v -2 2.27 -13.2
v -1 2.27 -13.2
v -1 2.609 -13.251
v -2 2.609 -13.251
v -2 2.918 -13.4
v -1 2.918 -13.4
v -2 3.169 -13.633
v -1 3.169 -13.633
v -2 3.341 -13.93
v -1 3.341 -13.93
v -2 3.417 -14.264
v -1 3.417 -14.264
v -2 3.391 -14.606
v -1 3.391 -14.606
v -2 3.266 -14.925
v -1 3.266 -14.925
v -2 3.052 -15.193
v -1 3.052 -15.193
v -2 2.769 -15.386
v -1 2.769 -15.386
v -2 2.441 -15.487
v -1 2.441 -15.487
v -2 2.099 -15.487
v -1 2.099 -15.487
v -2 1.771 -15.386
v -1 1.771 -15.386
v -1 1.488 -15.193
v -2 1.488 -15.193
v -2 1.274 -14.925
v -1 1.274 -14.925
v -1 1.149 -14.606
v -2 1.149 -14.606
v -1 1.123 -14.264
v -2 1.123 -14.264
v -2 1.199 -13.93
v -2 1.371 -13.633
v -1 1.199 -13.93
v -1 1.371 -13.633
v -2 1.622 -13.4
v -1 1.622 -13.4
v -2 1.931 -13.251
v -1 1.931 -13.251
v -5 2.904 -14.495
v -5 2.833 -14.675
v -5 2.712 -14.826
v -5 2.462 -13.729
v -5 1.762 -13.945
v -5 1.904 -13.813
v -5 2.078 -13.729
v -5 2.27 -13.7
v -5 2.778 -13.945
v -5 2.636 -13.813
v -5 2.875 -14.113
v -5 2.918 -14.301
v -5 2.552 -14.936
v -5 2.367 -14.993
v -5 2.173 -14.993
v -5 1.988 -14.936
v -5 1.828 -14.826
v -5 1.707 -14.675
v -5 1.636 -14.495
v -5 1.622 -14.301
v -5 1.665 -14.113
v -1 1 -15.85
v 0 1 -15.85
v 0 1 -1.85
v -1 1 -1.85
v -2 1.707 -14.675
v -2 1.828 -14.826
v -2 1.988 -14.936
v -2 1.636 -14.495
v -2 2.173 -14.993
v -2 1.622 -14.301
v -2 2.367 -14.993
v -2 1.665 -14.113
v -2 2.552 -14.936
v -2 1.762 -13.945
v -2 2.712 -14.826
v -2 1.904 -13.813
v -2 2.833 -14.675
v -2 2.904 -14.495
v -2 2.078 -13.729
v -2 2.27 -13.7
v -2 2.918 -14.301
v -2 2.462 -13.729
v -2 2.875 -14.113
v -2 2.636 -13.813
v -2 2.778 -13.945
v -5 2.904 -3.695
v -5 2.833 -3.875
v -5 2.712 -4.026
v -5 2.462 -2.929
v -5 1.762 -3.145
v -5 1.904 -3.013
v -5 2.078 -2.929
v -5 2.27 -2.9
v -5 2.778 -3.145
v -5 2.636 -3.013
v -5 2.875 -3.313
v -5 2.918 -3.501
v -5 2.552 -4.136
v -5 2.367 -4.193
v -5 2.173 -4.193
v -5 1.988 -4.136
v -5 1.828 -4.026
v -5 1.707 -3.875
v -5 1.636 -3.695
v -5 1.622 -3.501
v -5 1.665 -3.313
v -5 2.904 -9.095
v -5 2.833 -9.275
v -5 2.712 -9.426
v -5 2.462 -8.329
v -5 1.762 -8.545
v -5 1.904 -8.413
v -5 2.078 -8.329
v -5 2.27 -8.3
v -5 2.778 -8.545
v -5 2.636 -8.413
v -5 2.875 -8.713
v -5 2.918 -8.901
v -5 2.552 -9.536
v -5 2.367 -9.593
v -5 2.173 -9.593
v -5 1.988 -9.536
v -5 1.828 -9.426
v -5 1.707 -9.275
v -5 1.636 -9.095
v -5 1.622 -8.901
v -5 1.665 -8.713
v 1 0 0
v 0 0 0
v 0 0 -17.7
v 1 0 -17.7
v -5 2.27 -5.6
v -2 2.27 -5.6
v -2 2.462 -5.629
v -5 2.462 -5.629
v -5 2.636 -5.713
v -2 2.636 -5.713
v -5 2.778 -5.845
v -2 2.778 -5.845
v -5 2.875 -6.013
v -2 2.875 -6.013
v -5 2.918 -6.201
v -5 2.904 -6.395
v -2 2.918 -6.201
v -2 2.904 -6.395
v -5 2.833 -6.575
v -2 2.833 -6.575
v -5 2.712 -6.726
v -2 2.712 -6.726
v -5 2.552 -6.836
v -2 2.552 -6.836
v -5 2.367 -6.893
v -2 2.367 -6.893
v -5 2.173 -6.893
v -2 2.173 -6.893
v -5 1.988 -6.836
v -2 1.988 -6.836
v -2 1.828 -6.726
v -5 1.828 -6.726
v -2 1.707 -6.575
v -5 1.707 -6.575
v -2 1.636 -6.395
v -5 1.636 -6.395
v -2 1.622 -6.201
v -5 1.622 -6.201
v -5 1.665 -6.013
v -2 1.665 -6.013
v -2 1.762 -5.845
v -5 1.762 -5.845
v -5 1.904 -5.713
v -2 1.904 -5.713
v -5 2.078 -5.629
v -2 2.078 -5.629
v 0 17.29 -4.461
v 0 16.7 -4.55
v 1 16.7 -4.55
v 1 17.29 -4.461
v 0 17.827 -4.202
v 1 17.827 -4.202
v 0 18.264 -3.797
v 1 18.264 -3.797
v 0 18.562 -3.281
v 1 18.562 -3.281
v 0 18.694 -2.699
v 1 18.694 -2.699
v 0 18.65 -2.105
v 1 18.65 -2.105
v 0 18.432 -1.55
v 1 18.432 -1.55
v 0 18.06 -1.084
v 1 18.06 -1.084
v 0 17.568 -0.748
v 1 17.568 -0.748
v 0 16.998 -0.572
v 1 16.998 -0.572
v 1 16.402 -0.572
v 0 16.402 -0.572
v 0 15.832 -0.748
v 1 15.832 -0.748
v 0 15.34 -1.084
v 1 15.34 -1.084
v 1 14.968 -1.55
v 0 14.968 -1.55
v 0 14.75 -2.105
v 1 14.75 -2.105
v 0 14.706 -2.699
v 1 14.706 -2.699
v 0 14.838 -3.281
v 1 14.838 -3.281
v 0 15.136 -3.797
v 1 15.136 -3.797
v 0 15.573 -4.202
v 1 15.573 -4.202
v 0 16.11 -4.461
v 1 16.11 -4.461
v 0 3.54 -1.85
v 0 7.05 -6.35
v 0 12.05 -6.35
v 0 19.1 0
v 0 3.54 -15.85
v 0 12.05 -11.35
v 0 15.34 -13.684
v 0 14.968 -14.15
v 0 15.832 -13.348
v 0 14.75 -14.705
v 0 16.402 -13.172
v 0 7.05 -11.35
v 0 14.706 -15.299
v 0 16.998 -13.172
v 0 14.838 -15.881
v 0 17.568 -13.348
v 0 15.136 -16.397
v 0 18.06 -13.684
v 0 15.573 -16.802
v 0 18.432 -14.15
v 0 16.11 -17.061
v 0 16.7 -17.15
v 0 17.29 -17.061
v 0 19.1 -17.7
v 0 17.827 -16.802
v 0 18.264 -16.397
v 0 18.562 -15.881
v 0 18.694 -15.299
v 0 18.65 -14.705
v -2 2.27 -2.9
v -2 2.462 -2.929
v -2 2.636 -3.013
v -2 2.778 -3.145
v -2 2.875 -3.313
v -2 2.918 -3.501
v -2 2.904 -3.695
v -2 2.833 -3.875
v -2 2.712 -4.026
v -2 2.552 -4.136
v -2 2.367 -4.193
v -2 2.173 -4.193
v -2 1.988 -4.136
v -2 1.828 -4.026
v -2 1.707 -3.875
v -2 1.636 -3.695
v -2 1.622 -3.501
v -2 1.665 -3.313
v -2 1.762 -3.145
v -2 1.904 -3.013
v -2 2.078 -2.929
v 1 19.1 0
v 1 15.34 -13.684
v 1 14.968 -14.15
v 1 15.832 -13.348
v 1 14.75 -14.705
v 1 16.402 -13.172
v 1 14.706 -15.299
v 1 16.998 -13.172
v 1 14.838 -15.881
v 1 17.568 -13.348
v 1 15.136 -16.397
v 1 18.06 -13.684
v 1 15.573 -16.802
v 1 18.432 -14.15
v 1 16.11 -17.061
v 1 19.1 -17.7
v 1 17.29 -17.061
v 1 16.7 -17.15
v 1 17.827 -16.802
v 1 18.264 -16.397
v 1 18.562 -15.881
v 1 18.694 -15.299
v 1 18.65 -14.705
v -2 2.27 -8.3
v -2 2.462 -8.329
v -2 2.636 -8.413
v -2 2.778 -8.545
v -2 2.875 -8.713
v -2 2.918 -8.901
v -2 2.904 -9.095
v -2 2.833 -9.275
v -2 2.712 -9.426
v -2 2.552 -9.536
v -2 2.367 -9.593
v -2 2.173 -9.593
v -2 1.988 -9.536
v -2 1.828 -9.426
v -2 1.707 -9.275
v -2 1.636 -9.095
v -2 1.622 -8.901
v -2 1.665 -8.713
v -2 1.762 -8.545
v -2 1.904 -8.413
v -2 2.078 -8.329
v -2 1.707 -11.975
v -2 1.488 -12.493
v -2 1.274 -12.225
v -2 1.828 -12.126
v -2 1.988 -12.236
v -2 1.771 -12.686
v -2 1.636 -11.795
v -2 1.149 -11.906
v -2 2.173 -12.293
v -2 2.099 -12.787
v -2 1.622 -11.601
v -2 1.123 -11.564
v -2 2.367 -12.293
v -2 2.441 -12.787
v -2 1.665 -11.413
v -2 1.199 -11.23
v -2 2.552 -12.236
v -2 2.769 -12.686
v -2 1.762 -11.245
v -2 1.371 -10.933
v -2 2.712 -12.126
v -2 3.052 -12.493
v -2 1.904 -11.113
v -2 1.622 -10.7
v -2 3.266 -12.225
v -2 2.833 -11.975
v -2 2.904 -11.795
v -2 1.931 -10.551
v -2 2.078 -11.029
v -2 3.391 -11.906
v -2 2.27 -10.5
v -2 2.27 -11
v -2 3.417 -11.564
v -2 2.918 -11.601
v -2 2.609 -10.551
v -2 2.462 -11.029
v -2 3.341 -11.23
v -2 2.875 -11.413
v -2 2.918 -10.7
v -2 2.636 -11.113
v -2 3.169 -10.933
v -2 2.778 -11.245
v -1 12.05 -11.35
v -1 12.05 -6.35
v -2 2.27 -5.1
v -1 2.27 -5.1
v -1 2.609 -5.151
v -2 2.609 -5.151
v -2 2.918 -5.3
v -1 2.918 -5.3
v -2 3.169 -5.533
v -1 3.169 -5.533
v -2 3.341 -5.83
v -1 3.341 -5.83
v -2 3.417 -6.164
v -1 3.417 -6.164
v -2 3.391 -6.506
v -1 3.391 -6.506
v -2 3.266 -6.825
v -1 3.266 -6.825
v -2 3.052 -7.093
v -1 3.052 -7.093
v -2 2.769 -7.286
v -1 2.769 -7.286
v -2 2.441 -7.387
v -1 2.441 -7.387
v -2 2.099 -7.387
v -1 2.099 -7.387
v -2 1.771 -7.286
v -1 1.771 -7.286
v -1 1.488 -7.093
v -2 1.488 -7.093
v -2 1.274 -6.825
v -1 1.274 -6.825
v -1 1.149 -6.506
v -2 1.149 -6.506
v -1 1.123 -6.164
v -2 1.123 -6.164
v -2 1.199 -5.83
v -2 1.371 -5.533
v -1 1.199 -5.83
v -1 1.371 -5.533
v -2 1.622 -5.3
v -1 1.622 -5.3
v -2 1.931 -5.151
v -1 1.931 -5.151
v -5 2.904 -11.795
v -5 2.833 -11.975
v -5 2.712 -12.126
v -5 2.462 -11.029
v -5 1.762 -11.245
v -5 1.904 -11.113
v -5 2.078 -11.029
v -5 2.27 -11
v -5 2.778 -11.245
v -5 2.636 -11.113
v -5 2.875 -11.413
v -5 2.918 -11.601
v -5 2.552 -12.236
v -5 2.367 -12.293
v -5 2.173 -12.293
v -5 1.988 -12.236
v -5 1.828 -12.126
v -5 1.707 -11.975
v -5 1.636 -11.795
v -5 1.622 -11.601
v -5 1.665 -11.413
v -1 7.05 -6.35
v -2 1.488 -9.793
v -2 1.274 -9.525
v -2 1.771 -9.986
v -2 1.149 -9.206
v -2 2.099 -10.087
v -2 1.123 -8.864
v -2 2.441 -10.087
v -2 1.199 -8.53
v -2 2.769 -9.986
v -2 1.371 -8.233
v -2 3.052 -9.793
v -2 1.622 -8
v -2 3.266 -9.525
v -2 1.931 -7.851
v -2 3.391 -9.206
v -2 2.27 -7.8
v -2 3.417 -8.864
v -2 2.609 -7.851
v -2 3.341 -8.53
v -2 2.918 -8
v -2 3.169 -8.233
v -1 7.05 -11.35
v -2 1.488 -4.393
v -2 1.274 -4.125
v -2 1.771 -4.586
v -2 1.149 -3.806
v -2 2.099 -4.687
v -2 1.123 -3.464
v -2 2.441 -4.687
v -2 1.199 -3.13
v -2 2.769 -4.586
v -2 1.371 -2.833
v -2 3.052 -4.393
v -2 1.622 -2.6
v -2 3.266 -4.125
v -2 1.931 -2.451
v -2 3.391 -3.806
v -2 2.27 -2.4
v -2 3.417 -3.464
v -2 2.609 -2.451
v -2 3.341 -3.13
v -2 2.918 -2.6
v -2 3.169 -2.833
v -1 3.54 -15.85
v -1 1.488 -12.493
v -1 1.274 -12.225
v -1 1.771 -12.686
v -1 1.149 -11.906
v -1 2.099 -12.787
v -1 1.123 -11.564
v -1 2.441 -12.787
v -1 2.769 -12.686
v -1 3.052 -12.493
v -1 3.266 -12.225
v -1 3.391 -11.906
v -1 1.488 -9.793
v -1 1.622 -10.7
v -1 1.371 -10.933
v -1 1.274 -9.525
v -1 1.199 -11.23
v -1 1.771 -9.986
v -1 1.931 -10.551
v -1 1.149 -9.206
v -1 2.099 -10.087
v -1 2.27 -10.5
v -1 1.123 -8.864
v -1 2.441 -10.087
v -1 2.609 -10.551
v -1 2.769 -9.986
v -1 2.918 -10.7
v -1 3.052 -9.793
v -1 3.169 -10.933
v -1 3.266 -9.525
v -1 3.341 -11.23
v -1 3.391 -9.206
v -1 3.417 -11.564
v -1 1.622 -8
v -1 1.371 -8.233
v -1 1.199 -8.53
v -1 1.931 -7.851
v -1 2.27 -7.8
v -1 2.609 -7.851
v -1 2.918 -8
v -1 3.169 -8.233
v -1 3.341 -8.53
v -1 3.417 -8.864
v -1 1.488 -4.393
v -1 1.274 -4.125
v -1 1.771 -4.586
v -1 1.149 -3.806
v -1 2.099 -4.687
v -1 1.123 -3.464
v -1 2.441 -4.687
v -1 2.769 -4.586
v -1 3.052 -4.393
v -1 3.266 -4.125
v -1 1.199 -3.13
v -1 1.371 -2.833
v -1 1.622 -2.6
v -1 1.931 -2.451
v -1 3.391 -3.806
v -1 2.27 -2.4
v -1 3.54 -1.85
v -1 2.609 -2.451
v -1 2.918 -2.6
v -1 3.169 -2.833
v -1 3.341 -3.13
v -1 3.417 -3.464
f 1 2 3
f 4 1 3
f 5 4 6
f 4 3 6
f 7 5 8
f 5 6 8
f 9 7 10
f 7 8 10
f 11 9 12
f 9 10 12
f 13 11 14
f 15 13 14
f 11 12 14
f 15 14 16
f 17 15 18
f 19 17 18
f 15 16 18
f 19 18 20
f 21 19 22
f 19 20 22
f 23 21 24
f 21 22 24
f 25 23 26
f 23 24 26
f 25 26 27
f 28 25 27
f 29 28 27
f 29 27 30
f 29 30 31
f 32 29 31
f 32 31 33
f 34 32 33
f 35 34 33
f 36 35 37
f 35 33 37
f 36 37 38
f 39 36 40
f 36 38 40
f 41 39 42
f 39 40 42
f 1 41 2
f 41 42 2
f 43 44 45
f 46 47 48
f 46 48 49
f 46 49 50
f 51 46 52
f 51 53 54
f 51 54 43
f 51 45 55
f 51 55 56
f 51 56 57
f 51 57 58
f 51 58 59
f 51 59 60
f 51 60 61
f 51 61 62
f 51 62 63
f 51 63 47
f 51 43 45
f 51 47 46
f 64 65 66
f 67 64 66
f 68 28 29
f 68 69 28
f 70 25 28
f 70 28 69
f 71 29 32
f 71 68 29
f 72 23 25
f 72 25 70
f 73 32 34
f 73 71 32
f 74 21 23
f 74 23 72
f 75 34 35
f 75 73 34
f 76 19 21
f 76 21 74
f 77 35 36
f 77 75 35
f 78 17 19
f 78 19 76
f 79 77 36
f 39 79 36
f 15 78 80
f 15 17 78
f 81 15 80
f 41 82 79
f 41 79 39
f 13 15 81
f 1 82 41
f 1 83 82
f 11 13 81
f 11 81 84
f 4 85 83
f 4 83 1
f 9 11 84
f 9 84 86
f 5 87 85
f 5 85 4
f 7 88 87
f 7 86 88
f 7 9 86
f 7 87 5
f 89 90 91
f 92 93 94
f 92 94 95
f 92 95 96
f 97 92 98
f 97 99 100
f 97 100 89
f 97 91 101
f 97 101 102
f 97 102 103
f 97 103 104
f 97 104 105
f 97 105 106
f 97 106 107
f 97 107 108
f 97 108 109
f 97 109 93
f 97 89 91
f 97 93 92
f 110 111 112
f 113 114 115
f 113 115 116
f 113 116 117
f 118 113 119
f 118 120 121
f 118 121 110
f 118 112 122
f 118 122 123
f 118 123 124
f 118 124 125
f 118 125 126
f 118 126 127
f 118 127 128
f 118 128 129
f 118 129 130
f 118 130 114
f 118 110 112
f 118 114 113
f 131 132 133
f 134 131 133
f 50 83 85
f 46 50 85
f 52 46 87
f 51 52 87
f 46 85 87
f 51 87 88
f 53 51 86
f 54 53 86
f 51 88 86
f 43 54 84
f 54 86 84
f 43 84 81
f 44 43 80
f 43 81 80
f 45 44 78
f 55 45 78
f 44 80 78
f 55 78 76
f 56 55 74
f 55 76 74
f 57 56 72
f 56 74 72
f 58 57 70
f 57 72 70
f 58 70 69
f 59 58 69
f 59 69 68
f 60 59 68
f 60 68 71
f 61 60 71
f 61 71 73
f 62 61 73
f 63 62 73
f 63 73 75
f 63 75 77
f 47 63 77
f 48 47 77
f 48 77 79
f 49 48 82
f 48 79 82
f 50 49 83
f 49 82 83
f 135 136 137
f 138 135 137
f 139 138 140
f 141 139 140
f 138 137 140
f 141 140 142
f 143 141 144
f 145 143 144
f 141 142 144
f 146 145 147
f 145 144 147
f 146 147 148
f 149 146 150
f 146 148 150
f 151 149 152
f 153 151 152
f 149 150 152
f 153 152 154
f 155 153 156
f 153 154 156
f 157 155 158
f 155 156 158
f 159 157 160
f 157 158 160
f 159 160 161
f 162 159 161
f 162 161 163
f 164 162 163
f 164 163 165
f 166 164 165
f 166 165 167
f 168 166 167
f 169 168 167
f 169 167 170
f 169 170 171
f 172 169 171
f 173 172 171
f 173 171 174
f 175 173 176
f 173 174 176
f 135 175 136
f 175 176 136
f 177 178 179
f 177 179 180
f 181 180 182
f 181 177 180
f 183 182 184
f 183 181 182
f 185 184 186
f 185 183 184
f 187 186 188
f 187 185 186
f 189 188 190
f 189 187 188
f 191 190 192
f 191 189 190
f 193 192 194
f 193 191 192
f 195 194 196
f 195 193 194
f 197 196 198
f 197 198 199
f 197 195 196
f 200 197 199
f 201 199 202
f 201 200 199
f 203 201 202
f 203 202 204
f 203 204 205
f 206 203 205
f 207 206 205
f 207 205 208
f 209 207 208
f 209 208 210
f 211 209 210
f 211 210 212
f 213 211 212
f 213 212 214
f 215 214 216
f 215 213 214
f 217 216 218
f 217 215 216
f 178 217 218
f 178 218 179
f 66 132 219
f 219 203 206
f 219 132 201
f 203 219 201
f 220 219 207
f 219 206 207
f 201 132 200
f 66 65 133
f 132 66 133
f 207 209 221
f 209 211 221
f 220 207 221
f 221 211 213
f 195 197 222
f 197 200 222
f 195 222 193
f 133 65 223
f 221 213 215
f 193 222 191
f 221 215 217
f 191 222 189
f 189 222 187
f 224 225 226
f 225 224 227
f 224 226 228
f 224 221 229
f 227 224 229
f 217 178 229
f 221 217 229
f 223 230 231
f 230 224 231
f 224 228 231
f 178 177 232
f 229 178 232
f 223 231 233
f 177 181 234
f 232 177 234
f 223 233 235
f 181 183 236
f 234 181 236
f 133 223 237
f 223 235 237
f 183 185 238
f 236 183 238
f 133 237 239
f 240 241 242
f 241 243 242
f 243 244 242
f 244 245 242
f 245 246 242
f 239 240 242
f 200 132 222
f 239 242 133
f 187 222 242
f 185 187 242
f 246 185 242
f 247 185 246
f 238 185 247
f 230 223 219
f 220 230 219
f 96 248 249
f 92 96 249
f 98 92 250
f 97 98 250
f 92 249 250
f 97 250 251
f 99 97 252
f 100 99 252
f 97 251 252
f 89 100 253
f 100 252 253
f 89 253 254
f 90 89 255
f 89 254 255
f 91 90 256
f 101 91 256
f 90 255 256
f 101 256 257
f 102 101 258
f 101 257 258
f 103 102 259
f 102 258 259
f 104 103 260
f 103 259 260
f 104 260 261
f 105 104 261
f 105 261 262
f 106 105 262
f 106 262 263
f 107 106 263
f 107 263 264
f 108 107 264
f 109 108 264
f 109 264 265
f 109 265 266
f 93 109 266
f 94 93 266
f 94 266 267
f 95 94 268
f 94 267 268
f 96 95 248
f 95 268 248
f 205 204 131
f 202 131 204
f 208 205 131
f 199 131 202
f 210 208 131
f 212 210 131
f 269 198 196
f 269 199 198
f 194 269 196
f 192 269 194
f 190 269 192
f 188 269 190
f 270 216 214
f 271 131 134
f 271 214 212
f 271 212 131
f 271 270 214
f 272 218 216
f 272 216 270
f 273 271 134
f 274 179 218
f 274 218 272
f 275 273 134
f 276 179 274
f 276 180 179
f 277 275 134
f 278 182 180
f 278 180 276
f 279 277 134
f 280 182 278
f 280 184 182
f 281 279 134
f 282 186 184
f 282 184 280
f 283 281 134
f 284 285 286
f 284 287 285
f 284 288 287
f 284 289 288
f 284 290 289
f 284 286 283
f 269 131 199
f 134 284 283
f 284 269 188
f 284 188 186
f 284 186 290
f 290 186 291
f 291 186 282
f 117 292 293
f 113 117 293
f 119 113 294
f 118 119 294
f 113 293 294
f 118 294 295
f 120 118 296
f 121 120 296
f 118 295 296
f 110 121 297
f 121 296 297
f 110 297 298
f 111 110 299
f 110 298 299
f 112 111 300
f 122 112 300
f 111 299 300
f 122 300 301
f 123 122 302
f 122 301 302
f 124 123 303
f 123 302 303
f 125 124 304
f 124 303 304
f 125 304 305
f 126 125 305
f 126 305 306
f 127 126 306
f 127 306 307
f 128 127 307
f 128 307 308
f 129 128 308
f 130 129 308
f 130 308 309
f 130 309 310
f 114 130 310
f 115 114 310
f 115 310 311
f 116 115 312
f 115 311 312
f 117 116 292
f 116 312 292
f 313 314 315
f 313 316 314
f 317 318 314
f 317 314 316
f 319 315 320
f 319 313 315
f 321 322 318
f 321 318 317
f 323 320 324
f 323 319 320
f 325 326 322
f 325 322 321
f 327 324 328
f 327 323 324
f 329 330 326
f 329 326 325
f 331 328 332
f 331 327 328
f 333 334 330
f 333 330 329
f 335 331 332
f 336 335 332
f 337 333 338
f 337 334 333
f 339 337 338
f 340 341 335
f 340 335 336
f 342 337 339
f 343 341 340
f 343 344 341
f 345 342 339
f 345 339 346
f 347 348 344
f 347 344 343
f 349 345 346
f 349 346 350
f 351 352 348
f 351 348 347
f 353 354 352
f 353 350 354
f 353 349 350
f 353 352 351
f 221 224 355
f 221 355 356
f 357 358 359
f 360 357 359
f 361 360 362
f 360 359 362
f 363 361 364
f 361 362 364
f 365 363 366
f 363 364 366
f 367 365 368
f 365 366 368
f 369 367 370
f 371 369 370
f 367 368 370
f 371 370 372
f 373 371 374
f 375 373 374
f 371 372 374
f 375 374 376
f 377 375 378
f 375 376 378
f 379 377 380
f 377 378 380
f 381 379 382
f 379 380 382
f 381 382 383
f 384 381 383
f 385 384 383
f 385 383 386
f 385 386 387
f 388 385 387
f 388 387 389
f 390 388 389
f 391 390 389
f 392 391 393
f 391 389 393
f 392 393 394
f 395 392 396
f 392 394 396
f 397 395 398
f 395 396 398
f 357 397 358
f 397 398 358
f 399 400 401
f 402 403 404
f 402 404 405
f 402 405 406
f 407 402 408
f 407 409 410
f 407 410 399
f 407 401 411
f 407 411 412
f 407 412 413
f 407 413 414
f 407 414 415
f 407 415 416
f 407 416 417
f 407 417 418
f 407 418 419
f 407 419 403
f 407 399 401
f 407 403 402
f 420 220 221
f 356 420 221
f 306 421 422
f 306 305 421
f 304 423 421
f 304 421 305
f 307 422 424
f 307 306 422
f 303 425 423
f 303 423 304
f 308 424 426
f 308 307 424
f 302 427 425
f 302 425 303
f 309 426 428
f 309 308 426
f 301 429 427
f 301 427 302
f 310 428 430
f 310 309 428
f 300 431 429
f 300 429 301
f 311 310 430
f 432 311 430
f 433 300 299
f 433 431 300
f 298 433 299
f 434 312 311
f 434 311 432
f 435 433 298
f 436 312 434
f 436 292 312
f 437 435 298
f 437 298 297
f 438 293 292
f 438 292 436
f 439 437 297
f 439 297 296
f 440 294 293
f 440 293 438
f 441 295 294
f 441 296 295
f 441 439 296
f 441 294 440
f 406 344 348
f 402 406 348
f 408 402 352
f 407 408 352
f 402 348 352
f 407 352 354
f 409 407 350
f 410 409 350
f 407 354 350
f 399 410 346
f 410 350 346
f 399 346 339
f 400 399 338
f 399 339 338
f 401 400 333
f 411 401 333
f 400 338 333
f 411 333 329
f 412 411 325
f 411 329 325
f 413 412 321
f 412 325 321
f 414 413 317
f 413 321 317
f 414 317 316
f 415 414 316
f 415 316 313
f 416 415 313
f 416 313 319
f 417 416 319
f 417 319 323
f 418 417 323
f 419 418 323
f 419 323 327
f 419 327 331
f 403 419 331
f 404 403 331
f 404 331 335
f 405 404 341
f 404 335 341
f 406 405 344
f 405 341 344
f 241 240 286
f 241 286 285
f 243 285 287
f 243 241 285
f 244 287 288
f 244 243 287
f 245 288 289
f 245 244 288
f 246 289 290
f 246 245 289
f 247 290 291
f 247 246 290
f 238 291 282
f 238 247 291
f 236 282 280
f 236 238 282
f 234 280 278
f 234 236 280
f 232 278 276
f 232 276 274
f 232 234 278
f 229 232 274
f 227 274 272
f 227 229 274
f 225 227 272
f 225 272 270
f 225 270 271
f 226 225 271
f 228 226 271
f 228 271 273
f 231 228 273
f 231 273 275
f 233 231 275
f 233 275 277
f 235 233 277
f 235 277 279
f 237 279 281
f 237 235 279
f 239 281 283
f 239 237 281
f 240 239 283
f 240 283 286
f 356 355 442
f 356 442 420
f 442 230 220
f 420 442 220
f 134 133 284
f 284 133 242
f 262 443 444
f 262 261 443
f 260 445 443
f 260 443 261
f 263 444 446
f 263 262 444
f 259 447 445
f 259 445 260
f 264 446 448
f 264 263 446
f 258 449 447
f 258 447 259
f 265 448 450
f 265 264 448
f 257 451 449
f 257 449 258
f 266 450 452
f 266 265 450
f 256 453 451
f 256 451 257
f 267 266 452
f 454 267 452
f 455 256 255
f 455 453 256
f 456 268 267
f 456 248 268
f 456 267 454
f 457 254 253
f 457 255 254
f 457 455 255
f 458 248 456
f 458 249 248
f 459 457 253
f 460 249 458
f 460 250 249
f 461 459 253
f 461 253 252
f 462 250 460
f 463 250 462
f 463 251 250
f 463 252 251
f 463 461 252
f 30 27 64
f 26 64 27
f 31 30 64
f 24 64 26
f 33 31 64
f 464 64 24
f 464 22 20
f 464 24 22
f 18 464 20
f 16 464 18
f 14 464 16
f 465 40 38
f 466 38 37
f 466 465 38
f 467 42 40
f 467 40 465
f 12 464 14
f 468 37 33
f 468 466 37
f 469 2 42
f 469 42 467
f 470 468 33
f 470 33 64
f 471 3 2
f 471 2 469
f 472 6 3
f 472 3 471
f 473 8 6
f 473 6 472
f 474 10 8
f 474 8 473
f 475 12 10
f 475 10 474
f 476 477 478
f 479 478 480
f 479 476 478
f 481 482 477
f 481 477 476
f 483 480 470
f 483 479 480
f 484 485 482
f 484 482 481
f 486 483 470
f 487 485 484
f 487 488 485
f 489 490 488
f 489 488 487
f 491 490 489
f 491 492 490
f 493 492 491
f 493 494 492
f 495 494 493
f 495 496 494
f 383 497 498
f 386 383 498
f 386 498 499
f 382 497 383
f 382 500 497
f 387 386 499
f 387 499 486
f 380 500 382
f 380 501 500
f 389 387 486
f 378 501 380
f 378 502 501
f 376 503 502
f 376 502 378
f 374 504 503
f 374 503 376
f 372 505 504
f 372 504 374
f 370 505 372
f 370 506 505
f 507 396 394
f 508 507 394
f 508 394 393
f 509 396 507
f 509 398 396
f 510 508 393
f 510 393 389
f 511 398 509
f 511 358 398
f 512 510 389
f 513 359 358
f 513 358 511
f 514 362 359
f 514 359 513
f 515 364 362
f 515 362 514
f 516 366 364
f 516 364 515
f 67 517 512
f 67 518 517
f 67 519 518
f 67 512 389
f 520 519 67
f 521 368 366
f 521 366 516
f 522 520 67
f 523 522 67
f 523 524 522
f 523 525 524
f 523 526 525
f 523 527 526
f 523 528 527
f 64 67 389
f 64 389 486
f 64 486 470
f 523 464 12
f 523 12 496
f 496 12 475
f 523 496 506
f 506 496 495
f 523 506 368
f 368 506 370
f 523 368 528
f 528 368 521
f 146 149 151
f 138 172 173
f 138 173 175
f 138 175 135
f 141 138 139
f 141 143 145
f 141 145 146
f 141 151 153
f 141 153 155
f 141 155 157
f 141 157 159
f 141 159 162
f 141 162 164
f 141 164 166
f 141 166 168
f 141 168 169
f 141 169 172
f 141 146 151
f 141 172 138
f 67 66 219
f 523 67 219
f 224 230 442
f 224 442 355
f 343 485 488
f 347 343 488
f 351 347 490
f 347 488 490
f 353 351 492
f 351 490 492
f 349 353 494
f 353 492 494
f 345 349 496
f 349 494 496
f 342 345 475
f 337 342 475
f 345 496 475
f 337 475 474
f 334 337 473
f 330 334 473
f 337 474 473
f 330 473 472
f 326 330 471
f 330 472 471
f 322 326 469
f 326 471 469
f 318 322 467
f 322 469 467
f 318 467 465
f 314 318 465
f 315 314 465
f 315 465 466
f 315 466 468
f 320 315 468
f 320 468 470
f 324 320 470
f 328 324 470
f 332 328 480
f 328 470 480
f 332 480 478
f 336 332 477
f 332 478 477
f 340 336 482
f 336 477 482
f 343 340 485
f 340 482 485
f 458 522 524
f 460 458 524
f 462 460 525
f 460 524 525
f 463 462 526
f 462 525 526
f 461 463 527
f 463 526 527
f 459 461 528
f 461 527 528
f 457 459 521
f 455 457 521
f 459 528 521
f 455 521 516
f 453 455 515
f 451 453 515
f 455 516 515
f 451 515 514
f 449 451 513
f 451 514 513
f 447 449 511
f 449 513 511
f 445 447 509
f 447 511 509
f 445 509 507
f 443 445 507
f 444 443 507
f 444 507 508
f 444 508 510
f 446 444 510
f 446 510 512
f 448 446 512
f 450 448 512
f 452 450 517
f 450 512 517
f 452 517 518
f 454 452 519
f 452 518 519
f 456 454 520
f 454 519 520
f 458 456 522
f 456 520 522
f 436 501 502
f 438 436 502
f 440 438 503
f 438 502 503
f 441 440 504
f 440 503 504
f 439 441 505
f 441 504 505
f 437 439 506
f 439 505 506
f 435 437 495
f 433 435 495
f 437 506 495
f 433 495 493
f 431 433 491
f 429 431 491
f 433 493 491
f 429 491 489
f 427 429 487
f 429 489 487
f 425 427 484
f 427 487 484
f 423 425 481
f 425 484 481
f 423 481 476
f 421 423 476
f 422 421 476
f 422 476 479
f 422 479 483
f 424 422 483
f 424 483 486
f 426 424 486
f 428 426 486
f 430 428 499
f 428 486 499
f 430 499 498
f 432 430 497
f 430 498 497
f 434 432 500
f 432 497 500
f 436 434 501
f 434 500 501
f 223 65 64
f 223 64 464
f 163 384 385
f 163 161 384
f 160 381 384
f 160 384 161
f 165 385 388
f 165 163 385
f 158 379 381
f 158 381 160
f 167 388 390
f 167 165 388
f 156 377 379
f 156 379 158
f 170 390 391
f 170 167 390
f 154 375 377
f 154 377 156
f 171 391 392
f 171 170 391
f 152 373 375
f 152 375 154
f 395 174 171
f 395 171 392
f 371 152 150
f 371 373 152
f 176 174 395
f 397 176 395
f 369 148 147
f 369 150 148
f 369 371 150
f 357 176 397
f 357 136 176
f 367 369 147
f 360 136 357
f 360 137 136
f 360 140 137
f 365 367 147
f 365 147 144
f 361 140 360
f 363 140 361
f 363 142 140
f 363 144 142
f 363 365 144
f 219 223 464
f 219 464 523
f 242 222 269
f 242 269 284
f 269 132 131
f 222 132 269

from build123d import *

# Parameters (mm, degrees)
SKETCH1_W           = 17.7
SKETCH1_H           = 19.1
SKETCH1_R           = 2
BOSS_EXTRUDE1_DEPTH = 1
SKETCH2_W           = 14
SKETCH2_H           = 2.54
SKETCH2_W_2         = 5
SKETCH2_H_2         = 5
BOSS_EXTRUDE2_DEPTH = 1
SKETCH3_R           = 1.15
BOSS_EXTRUDE3_DEPTH = 1
SKETCH4_R           = 0.65
BOSS_EXTRUDE4_DEPTH = 3


with BuildPart() as part:
    # Sketch1 → Boss-Extrude1 (new body)
    with BuildSketch(Plane(origin=(0, 0, 0), x_dir=(0, 0, -1), z_dir=(1, 0, 0))):
        with Locations((8.85, 9.55)):
            Rectangle(SKETCH1_W, SKETCH1_H)
        with Locations((15.15, 16.7)):
            Circle(SKETCH1_R, mode=Mode.SUBTRACT)
        with Locations((2.55, 16.7)):
            Circle(SKETCH1_R, mode=Mode.SUBTRACT)
    extrude(amount=BOSS_EXTRUDE1_DEPTH)

    # Sketch2 → Boss-Extrude2 (add)
    with BuildSketch(Plane.ZY):
        with Locations((-8.85, 2.27)):
            Rectangle(SKETCH2_W, SKETCH2_H)
        with Locations((-8.85, 9.55)):
            Rectangle(SKETCH2_W_2, SKETCH2_H_2)
    extrude(amount=BOSS_EXTRUDE2_DEPTH)

    # Sketch3 → Boss-Extrude3 (add)
    with BuildSketch(Plane.ZY.offset(1)):
        with Locations((-14.35, 2.27)):
            Circle(SKETCH3_R)
        with Locations((-11.65, 2.27)):
            Circle(SKETCH3_R)
        with Locations((-8.95, 2.27)):
            Circle(SKETCH3_R)
        with Locations((-6.25, 2.27)):
            Circle(SKETCH3_R)
        with Locations((-3.55, 2.27)):
            Circle(SKETCH3_R)
    extrude(amount=BOSS_EXTRUDE3_DEPTH)

    # Sketch4 → Boss-Extrude4 (add)
    with BuildSketch(Plane.ZY.offset(2)):
        with Locations((-14.35, 2.27)):
            Circle(SKETCH4_R)
        with Locations((-11.65, 2.27)):
            Circle(SKETCH4_R)
        with Locations((-8.95, 2.27)):
            Circle(SKETCH4_R)
        with Locations((-6.25, 2.27)):
            Circle(SKETCH4_R)
        with Locations((-3.55, 2.27)):
            Circle(SKETCH4_R)
    extrude(amount=BOSS_EXTRUDE4_DEPTH)


solid = part.part
